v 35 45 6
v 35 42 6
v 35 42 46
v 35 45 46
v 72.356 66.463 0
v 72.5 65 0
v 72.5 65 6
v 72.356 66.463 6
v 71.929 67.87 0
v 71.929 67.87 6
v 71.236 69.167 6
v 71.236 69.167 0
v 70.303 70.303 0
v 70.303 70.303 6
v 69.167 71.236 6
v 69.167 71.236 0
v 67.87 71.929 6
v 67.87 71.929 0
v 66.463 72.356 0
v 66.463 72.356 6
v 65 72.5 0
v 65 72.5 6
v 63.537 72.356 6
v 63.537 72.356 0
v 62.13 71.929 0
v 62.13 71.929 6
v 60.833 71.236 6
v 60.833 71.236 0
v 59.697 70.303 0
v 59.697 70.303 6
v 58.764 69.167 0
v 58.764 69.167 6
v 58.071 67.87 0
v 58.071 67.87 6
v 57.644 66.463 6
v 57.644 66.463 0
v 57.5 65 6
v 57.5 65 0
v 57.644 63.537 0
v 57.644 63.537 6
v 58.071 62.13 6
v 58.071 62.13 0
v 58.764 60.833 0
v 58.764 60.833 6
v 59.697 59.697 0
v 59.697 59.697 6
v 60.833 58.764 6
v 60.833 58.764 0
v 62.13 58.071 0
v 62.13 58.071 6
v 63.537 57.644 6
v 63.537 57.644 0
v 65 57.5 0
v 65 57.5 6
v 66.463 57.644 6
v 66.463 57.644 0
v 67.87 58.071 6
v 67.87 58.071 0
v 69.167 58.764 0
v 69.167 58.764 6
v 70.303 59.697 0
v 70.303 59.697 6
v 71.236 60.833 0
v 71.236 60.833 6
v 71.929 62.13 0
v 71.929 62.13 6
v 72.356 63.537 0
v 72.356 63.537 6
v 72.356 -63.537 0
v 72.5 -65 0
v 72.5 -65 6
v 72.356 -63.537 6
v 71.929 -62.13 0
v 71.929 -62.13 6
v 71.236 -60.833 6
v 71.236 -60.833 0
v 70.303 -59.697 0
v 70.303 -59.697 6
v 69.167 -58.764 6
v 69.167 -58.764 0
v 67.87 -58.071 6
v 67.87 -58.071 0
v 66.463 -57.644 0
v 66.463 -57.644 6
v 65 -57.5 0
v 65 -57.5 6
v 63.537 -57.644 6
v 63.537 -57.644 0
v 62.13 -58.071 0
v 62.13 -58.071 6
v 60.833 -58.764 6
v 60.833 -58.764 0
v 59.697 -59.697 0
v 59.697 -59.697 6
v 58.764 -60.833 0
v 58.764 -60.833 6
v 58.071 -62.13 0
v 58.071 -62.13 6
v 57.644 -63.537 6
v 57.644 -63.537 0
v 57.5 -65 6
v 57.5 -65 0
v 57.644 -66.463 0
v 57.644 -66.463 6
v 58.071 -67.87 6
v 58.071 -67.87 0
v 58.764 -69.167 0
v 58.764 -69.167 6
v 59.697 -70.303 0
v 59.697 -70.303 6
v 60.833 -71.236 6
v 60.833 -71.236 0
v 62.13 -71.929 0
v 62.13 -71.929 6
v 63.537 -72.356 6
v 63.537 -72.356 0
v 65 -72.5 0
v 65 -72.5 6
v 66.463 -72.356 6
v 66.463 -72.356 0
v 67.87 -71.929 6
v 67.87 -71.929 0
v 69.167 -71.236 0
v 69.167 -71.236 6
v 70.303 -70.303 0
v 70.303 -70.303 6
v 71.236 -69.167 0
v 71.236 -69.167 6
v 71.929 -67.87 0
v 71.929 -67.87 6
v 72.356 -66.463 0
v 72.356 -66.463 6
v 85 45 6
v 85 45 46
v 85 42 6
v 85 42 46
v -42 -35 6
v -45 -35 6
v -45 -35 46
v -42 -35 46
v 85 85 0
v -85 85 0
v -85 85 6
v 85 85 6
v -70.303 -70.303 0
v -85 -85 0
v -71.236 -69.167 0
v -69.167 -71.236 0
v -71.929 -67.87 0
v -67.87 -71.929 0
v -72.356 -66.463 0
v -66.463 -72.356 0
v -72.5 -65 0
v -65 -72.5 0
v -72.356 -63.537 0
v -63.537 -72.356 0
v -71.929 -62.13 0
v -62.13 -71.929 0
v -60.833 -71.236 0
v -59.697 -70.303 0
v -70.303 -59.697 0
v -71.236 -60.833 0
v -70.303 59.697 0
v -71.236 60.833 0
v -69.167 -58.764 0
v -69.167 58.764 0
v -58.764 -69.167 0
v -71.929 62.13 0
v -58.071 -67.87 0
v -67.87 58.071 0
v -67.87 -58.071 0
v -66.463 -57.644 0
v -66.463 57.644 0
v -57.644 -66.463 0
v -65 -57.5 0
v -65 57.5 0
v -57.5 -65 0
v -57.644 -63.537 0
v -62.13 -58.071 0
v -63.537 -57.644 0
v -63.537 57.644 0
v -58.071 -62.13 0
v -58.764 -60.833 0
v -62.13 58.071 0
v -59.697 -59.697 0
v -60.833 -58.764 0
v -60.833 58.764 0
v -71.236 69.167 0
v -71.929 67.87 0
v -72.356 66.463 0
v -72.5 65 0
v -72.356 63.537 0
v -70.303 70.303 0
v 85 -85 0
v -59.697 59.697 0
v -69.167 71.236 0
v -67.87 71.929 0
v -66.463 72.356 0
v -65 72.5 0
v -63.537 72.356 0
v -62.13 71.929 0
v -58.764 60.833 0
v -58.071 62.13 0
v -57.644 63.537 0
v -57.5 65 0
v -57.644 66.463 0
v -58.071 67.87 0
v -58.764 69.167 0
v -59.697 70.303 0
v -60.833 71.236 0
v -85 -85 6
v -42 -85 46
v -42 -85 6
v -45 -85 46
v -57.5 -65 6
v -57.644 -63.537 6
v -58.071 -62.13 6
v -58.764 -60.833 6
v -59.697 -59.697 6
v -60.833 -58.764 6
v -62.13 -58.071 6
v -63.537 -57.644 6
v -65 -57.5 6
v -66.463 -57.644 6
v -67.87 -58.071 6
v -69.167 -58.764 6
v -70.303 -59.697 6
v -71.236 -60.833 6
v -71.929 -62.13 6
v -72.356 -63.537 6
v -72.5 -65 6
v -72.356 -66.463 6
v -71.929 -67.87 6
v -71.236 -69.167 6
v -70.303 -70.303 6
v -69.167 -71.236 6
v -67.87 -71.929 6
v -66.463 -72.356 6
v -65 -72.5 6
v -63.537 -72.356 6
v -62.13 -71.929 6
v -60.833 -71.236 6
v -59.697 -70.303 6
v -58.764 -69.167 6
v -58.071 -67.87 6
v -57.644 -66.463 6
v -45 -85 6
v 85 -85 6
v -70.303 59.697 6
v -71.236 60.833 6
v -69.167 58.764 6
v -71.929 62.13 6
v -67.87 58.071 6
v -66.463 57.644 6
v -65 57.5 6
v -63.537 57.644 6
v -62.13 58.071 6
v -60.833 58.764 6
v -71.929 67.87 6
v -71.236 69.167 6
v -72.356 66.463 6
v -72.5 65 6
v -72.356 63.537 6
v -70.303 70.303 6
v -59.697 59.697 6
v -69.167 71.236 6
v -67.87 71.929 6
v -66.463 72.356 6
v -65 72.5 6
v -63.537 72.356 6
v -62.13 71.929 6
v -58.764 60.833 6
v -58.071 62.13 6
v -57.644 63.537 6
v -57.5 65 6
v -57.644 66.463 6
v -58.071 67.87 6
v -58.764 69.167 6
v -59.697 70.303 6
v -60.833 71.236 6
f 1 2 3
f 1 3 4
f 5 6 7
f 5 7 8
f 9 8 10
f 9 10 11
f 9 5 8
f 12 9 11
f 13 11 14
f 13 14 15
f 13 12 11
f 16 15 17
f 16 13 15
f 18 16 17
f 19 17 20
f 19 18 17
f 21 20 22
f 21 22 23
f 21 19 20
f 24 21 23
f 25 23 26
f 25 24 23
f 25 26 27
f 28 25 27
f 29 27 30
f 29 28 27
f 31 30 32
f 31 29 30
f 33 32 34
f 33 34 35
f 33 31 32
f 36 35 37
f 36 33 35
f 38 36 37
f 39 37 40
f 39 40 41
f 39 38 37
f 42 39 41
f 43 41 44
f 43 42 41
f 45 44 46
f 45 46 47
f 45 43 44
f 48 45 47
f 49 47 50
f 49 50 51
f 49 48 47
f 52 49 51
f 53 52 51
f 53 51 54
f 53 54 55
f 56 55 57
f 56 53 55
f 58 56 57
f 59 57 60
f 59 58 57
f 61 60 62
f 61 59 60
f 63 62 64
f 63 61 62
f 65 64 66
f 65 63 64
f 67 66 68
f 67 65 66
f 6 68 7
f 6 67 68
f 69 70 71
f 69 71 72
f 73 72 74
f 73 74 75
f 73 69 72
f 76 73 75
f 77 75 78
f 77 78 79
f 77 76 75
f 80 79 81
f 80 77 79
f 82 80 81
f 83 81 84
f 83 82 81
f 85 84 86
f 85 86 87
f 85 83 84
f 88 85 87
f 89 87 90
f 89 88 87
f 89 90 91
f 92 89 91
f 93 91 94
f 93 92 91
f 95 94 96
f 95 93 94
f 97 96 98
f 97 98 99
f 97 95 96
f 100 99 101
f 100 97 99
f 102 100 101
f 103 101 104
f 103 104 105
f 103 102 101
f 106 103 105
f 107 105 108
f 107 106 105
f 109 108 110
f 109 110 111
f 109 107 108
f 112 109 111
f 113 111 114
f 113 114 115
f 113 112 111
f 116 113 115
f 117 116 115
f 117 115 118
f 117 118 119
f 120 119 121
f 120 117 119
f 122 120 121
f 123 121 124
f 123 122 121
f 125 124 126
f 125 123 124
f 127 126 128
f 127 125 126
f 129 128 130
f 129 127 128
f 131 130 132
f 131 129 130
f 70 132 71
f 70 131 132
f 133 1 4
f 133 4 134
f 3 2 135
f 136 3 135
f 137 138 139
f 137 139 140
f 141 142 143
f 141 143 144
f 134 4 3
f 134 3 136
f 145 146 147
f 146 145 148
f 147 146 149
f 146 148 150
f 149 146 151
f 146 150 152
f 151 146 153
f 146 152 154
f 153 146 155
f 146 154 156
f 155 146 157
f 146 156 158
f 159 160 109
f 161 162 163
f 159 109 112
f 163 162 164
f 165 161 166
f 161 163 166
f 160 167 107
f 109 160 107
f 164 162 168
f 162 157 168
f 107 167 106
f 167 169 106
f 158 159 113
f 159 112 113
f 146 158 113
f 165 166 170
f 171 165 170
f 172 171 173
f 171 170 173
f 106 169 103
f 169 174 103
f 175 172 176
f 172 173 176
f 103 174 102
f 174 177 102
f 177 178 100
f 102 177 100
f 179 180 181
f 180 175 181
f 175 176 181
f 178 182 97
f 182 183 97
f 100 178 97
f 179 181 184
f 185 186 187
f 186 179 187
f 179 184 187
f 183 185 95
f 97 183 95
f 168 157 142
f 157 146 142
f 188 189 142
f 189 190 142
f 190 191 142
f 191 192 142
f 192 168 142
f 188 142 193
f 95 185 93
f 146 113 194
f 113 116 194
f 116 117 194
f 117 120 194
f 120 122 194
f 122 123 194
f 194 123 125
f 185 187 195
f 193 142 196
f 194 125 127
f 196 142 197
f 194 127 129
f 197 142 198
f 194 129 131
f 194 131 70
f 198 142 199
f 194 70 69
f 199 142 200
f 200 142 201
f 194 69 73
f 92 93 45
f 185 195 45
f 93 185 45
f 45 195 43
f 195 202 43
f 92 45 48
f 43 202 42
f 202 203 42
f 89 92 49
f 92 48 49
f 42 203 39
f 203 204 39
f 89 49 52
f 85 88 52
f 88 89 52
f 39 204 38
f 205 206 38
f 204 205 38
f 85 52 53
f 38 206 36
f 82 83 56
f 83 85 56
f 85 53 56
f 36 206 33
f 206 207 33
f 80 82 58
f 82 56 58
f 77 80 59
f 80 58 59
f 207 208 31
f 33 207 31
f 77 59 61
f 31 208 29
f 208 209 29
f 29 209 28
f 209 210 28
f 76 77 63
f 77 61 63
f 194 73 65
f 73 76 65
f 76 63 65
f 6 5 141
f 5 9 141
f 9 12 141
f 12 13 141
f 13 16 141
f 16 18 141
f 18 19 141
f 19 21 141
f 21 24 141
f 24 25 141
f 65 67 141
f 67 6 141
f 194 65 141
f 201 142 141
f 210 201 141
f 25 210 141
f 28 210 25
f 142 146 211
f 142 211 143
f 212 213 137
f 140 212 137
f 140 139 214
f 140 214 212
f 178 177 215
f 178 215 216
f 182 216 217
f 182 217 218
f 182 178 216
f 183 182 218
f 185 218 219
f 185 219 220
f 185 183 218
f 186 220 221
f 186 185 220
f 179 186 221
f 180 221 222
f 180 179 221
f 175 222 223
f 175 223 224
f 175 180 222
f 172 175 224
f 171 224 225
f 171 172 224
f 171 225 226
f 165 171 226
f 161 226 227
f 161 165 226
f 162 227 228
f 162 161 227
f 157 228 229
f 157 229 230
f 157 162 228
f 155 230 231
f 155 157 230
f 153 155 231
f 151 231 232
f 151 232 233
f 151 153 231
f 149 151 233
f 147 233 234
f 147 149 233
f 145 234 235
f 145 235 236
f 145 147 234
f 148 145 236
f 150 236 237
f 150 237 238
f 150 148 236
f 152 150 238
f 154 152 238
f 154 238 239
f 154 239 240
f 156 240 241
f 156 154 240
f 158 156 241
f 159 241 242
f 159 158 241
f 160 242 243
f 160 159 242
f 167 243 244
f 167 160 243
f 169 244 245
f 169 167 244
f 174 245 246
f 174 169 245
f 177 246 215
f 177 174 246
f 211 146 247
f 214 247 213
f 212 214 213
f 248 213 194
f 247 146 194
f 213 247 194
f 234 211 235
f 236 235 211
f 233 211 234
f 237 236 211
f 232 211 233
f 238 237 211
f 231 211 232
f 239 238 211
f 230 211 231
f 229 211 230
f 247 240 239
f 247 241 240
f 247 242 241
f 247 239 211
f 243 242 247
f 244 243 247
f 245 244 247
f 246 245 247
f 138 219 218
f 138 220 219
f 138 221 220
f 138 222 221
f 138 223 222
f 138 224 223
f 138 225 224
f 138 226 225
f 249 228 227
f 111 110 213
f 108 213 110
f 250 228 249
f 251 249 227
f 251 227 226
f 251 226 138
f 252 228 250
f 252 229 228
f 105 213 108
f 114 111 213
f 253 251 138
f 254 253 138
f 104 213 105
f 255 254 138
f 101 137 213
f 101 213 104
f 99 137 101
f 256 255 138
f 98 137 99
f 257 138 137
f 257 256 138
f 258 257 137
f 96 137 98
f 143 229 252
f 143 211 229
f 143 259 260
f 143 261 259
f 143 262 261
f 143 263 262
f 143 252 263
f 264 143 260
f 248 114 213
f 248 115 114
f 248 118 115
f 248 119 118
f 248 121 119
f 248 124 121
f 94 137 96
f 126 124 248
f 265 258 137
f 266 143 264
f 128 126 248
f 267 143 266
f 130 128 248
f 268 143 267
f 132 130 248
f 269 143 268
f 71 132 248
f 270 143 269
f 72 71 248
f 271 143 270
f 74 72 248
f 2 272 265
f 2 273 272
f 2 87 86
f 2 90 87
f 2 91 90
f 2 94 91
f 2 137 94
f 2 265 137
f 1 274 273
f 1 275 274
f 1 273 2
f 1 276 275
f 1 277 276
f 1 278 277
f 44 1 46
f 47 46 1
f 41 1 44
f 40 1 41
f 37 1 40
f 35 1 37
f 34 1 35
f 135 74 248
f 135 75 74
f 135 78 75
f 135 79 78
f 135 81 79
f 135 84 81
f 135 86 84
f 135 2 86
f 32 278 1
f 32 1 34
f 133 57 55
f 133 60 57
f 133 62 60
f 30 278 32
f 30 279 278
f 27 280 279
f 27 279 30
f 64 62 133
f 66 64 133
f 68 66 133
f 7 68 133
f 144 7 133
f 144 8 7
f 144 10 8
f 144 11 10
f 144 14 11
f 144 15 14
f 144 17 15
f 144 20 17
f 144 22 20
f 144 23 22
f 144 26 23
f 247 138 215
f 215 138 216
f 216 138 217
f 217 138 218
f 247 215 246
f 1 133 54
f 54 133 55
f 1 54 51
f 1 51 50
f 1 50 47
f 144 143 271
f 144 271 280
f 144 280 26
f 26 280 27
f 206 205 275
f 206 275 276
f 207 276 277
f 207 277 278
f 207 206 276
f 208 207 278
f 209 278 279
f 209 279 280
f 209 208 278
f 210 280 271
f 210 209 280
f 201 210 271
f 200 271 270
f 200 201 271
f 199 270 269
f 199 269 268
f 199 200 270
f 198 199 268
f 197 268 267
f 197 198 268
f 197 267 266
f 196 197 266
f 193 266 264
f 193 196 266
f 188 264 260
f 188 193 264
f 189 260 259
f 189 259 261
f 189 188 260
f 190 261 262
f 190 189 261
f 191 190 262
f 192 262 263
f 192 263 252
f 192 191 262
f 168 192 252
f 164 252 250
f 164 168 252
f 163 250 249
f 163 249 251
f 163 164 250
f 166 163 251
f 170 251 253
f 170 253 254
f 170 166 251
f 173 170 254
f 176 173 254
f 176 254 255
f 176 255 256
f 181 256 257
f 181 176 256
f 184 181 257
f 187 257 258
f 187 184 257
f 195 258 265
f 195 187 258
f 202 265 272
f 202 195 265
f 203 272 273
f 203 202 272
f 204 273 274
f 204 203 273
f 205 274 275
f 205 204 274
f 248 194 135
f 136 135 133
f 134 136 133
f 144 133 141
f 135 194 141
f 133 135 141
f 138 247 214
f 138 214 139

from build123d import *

# Parameters (mm, degrees)
F0_W     = 170
F0_H     = 170
F0_R     = 7.5
F1_DEPTH = 6
F2_W     = 3
F2_H     = 50
F2_W_2   = 50
F2_H_2   = 3
F3_DEPTH = 40


with BuildPart() as f1:
    # F0 (on Top) → F1 (new body)
    with BuildSketch(Plane.XY):
        Rectangle(F0_W, F0_H)
        with Locations((-65, -65)):
            Circle(F0_R, mode=Mode.SUBTRACT)
        with Locations((65, -65)):
            Circle(F0_R, mode=Mode.SUBTRACT)
        with Locations((-65, 65)):
            Circle(F0_R, mode=Mode.SUBTRACT)
        with Locations((65, 65)):
            Circle(F0_R, mode=Mode.SUBTRACT)
    extrude(amount=F1_DEPTH)

    # F2 (on face) → F3 (join)
    with BuildSketch(Plane.XY.offset(6)):
        with Locations((-43.5, -60)):
            Rectangle(F2_W, F2_H)
        with Locations((60, 43.5)):
            Rectangle(F2_W_2, F2_H_2)
    extrude(amount=F3_DEPTH)


solid = f1.part
